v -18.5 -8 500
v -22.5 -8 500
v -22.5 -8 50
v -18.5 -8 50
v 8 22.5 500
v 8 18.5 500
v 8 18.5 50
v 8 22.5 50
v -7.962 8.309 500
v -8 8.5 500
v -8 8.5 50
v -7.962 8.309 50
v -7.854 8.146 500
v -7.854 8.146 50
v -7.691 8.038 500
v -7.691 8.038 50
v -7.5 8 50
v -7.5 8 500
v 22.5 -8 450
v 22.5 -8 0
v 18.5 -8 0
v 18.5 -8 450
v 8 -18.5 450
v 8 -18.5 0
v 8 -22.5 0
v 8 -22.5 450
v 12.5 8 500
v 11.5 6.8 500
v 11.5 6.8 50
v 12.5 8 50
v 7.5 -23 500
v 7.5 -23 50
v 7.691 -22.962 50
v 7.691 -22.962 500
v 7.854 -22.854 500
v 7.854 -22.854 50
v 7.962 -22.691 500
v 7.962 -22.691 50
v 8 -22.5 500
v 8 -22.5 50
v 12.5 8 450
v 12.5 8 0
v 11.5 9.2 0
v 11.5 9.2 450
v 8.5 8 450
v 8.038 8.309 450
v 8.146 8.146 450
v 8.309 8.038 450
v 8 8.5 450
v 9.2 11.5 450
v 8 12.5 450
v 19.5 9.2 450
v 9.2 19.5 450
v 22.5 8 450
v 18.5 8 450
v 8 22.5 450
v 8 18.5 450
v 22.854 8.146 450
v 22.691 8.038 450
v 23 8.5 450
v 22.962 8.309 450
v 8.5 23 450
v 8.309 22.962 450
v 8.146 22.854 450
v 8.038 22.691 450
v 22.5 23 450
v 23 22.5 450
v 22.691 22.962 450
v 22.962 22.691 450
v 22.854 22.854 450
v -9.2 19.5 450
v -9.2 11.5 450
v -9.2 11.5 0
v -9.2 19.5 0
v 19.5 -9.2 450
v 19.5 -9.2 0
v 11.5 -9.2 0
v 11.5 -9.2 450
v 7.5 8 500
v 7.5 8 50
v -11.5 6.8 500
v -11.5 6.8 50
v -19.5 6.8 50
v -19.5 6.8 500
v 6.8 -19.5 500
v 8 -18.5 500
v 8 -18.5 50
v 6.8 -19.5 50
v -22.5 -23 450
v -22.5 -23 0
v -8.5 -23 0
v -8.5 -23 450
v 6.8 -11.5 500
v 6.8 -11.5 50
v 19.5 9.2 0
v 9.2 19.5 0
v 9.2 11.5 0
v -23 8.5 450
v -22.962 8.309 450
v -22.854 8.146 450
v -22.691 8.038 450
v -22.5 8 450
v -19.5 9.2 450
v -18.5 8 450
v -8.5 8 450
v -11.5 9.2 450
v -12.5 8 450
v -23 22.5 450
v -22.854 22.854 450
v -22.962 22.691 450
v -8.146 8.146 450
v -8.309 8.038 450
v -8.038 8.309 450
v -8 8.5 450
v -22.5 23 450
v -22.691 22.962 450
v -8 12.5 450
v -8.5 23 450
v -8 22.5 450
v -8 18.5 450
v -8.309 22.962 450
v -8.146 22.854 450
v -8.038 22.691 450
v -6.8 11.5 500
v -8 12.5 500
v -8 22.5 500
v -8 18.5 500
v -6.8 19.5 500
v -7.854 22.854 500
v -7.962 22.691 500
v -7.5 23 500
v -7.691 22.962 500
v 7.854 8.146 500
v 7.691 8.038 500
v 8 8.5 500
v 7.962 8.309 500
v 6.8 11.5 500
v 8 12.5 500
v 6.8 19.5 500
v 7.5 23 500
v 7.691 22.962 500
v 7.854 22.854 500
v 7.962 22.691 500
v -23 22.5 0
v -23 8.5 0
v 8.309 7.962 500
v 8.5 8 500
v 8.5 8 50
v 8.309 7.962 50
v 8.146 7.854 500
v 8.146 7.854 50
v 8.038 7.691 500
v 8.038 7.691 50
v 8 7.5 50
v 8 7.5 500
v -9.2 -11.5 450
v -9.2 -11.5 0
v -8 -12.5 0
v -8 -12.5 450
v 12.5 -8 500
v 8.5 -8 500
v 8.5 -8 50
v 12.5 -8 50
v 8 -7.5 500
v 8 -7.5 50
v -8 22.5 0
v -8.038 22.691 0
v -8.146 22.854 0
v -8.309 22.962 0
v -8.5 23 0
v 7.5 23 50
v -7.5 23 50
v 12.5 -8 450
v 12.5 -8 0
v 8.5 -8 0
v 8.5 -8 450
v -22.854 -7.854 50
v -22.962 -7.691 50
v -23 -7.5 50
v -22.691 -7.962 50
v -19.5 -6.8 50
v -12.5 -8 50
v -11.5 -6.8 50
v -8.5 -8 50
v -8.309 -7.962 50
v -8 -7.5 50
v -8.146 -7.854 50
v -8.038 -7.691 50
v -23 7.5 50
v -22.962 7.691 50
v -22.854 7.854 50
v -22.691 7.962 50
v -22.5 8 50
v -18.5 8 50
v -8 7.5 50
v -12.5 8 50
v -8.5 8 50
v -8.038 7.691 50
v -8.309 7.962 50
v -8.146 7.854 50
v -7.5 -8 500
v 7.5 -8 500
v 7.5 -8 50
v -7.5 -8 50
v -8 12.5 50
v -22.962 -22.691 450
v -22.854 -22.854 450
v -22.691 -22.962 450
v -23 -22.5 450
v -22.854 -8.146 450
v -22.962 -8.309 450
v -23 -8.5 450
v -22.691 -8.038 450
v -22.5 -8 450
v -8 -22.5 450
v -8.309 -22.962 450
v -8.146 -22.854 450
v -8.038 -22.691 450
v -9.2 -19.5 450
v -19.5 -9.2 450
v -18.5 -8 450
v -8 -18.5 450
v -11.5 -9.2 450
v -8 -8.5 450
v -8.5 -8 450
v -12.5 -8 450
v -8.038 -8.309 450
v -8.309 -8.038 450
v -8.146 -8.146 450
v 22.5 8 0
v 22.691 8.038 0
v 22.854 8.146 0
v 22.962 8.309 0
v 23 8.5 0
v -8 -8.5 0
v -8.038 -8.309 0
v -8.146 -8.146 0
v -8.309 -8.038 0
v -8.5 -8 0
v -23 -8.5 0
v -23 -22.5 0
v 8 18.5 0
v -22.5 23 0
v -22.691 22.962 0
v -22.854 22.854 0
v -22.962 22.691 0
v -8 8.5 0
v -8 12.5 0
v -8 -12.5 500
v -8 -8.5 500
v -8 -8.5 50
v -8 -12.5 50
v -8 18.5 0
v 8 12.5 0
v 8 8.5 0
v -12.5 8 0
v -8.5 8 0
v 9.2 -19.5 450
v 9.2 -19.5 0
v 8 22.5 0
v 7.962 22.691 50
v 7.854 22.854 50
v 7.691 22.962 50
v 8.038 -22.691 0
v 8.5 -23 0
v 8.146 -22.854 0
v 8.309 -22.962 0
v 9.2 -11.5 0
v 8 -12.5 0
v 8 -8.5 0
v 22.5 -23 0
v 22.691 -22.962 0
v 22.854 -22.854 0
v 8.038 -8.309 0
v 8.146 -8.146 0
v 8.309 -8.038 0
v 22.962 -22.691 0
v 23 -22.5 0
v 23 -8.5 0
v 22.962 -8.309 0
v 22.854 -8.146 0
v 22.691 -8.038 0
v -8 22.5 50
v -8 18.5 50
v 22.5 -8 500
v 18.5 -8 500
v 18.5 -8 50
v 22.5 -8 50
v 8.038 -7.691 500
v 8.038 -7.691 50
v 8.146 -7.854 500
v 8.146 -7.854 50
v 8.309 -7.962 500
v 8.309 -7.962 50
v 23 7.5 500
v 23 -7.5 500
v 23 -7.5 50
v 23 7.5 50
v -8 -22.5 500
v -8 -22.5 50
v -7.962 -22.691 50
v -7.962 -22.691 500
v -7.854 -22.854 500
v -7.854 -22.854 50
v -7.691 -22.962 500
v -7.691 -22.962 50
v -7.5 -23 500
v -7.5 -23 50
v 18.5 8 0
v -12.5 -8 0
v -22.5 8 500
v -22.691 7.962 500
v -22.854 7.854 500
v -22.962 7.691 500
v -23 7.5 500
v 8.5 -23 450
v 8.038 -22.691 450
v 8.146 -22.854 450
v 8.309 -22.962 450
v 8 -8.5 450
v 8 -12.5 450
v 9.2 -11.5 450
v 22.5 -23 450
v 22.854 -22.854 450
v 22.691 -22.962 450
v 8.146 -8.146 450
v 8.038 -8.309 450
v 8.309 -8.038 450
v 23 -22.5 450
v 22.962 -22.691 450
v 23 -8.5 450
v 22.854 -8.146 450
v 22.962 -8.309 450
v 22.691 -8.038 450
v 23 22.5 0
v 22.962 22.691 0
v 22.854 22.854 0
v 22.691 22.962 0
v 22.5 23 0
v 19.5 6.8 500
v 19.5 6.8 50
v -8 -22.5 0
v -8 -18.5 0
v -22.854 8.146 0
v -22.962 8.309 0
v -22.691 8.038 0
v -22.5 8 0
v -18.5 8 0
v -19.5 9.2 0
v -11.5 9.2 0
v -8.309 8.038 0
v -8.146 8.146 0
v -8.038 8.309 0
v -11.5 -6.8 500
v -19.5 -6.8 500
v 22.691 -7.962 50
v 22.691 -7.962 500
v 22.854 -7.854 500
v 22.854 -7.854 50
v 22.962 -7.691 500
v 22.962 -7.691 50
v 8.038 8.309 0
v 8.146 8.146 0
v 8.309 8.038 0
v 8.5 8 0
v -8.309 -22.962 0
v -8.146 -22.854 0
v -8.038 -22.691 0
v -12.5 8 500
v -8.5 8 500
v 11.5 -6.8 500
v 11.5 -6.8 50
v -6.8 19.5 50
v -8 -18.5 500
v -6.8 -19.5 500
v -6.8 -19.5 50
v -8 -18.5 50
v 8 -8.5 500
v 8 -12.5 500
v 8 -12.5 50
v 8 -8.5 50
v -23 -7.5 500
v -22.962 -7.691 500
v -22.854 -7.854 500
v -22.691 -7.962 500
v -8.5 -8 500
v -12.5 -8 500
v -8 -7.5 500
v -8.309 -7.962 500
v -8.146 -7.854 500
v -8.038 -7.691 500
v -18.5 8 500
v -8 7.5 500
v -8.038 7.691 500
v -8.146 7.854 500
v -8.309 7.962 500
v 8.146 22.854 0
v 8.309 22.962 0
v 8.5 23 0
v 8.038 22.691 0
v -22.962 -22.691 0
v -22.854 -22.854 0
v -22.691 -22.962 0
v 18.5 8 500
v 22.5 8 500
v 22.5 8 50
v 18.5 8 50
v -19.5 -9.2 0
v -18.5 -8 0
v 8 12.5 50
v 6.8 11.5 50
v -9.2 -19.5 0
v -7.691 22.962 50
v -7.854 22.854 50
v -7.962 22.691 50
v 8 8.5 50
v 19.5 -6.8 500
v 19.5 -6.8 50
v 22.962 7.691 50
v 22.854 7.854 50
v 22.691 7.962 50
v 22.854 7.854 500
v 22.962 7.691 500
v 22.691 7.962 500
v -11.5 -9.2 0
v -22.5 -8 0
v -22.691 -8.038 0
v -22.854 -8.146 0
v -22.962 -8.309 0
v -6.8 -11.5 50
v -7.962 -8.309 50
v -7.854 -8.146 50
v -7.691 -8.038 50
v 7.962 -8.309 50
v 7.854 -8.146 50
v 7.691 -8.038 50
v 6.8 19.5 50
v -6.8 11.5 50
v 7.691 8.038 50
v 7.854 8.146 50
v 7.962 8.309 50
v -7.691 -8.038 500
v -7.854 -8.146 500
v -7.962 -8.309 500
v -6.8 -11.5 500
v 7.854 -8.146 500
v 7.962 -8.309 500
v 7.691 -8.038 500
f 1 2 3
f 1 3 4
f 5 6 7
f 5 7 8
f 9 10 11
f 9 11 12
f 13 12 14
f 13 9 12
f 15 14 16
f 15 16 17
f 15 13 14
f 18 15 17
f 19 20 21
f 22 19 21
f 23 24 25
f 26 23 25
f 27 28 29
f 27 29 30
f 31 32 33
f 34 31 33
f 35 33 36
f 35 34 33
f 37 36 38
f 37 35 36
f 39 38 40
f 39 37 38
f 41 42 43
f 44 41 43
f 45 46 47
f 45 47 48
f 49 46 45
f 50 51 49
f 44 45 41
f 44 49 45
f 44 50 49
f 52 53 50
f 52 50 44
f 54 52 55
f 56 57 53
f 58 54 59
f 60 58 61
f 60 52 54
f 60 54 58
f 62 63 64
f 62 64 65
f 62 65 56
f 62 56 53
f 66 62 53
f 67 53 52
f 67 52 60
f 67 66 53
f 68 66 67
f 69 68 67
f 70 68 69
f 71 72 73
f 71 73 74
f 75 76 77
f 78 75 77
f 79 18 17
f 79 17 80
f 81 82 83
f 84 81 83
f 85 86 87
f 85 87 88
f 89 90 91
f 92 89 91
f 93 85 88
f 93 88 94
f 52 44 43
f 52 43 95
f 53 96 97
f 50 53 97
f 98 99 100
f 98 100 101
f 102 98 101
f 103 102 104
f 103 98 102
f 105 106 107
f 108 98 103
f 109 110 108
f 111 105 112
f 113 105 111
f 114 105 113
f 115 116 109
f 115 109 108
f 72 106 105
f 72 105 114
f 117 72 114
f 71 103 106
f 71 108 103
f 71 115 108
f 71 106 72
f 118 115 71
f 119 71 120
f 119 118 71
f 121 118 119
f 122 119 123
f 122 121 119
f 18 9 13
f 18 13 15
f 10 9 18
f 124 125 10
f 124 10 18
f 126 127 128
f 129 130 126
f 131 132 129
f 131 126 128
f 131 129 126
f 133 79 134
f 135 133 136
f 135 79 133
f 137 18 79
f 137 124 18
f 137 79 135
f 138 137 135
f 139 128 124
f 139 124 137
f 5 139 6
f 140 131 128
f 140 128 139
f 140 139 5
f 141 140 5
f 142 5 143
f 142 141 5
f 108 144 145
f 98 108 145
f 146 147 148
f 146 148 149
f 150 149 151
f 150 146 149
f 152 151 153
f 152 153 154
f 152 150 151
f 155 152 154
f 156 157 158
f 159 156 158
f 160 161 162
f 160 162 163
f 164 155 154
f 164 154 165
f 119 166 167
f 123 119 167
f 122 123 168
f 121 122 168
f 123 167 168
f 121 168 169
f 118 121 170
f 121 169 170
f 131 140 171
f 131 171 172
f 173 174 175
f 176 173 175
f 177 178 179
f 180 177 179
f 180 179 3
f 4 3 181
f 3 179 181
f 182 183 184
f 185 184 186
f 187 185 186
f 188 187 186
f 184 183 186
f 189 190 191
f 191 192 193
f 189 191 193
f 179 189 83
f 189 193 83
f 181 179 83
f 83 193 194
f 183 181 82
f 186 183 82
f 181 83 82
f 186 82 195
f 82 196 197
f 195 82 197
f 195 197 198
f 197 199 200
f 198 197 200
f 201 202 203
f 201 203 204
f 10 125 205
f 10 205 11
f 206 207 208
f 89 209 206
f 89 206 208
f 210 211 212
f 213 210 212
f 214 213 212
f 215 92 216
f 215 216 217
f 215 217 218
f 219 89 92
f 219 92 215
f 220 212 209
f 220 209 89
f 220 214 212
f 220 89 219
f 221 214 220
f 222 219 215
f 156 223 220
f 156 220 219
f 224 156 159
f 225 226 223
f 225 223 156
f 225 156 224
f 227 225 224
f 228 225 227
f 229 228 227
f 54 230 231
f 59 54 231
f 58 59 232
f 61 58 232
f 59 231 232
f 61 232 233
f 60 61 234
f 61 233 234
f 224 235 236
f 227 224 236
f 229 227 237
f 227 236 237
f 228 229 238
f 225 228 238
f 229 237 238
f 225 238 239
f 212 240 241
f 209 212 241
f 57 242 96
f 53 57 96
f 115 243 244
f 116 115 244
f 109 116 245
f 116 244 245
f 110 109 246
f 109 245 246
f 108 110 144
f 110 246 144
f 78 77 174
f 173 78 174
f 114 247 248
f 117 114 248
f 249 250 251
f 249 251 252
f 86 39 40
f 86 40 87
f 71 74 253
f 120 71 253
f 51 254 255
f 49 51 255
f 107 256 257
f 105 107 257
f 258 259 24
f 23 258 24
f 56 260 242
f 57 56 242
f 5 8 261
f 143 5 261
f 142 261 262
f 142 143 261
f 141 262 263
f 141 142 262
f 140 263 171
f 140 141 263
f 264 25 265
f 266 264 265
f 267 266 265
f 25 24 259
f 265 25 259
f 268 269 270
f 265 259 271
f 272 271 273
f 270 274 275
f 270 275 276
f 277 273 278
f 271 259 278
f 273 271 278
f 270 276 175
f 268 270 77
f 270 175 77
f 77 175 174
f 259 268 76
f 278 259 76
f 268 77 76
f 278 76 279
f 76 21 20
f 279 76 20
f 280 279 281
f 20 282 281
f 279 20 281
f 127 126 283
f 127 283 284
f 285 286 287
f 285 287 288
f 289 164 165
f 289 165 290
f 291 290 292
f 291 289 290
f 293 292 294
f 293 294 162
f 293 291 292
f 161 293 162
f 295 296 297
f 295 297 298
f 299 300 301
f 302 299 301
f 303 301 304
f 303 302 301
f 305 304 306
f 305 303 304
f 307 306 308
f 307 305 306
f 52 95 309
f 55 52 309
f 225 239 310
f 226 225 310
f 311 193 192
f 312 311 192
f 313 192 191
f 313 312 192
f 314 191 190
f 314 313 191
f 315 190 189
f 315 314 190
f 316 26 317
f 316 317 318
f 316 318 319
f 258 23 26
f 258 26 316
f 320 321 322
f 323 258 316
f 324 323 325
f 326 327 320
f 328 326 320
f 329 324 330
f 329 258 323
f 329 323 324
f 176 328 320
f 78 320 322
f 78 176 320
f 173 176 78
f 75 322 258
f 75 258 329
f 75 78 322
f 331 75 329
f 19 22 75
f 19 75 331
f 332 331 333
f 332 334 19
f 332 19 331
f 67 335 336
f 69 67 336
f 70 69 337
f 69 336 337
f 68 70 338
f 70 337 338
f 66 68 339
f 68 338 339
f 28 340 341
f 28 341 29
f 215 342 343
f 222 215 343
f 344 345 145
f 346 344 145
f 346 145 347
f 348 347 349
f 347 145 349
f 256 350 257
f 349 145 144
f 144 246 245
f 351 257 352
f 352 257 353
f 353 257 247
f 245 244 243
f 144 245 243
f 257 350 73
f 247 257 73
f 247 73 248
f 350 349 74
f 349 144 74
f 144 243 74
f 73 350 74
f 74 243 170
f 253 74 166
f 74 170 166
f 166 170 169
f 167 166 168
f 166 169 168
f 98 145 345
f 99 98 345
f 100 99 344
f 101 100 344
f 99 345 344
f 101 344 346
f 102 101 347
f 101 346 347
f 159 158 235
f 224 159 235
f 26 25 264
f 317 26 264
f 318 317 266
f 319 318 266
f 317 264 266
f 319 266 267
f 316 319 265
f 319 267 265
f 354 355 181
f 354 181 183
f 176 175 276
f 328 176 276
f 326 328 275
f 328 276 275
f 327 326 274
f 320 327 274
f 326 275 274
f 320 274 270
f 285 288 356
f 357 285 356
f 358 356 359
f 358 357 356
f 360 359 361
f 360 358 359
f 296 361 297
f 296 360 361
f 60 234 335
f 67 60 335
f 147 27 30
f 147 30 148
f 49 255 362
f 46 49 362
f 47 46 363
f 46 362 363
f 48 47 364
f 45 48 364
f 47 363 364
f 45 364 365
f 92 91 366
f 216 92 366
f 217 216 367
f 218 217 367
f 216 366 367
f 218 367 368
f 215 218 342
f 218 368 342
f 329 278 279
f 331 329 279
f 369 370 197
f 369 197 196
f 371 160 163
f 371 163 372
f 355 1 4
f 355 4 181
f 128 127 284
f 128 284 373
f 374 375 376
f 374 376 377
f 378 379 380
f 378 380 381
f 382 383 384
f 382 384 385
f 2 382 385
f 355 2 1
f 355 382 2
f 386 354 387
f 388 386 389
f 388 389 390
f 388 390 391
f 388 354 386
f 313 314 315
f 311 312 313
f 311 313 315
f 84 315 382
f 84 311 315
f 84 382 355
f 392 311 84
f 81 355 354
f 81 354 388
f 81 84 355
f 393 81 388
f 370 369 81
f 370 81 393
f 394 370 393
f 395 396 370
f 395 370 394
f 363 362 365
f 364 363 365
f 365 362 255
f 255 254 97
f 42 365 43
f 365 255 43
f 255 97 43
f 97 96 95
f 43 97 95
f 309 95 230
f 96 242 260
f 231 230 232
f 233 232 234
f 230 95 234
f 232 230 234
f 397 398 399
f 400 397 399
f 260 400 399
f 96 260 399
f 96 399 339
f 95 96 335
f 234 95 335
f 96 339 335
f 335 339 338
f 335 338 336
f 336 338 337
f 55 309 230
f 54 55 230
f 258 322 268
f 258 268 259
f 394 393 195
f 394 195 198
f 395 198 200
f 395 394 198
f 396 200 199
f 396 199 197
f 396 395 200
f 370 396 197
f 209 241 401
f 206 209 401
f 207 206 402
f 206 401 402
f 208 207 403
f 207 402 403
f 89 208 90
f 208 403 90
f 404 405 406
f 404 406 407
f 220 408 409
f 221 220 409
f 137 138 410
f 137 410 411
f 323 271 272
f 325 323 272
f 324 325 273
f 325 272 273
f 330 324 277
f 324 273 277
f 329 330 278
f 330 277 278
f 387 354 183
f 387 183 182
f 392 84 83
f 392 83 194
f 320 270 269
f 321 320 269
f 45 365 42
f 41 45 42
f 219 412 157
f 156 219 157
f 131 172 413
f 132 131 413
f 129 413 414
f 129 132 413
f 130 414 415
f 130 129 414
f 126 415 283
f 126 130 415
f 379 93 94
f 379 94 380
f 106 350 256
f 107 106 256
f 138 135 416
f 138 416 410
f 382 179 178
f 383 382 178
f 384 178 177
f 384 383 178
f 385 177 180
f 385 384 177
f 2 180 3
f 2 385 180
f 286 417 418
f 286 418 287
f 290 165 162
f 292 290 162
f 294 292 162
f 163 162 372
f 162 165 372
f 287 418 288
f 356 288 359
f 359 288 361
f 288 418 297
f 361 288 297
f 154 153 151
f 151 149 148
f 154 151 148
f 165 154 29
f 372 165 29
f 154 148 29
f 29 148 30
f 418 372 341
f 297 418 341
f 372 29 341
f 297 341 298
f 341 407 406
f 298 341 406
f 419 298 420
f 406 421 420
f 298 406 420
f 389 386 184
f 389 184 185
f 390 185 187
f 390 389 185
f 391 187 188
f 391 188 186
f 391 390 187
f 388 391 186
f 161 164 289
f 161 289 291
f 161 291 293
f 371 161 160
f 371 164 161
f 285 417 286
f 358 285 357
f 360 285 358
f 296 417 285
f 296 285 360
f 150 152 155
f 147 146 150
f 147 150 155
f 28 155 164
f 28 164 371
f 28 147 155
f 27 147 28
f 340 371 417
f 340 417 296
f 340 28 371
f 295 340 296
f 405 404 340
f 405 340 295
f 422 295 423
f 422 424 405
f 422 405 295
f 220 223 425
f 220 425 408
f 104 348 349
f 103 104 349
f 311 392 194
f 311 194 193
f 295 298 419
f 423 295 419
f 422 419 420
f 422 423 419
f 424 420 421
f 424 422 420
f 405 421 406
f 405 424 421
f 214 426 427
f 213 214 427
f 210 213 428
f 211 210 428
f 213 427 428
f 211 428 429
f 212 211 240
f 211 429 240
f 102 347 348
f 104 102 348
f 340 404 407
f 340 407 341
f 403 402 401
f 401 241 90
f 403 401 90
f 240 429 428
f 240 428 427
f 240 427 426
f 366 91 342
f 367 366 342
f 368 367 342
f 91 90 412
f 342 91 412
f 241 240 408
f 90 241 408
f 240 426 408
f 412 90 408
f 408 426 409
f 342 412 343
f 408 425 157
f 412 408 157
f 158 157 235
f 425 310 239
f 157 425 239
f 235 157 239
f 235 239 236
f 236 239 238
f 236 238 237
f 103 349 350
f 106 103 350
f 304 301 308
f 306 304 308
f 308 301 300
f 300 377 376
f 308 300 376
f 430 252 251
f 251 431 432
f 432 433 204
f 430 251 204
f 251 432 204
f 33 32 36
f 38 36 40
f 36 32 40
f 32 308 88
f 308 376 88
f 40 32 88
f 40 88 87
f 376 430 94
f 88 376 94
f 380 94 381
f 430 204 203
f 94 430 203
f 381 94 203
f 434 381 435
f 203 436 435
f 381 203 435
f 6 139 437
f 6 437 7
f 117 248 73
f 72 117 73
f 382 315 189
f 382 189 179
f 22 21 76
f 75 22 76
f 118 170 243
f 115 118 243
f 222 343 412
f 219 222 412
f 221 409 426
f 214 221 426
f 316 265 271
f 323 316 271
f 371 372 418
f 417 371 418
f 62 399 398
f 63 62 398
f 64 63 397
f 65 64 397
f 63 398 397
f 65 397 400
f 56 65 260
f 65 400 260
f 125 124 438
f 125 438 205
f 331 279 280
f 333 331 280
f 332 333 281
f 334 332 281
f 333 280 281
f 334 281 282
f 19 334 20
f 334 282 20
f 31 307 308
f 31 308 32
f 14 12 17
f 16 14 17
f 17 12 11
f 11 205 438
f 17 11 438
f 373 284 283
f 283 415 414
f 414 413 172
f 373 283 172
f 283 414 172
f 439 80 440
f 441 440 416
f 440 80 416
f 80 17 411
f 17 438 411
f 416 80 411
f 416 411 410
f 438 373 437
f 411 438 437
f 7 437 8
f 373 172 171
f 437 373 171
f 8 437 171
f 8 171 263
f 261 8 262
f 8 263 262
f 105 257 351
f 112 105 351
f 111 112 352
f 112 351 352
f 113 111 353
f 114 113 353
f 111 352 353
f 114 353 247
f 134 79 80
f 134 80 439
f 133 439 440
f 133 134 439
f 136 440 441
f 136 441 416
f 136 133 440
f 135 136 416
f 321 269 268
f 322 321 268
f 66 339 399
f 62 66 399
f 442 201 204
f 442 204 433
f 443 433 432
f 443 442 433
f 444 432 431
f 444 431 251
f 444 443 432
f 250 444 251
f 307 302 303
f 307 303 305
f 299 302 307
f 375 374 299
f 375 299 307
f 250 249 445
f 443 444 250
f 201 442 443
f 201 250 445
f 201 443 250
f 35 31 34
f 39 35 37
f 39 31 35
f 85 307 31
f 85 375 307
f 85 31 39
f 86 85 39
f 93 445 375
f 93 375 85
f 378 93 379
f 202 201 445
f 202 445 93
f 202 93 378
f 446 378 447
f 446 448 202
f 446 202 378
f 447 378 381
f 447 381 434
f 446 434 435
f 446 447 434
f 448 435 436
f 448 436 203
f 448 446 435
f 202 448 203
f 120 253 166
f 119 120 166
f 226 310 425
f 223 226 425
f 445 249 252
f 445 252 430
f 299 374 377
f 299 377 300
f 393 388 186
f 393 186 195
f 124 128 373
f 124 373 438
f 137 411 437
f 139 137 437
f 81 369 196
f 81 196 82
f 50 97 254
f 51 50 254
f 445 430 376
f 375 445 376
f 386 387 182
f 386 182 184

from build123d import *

# Parameters (mm, degrees)
F4_DEPTH = 450
F5_DEPTH = 450


with BuildPart() as f4:
    # F2 (on Top) → F4 (new body)
    with BuildSketch(Plane.XY):
        with BuildLine():
            Line((-22.5, -23), (-8.5, -23))
            ThreePointArc((-8.5, -23), (-8.146447, -22.853553), (-8, -22.5))
            Line((-8, -22.5), (-8, -18.5))
            Line((-8, -18.5), (-9.2, -19.5))
            Line((-9.2, -19.5), (-9.2, -15.5))
            Line((-9.2, -15.5), (-9.2, -11.5))
            Line((-9.2, -11.5), (-8, -12.5))
            Line((-8, -12.5), (-8, -8.5))
            ThreePointArc((-8, -8.5), (-8.146447, -8.146447), (-8.5, -8))
            Line((-8.5, -8), (-12.5, -8))
            Line((-12.5, -8), (-11.5, -9.2))
            Line((-11.5, -9.2), (-15.5, -9.2))
            Line((-15.5, -9.2), (-19.5, -9.2))
            Line((-19.5, -9.2), (-18.5, -8))
            Line((-18.5, -8), (-22.5, -8))
            ThreePointArc((-22.5, -8), (-22.853553, -8.146447), (-23, -8.5))
            Line((-23, -8.5), (-23, -22.5))
            ThreePointArc((-23, -22.5), (-22.853553, -22.853553), (-22.5, -23))
        make_face()
        with BuildLine():
            ThreePointArc((8, -22.5), (8.146447, -22.853553), (8.5, -23))
            Line((8.5, -23), (22.5, -23))
            ThreePointArc((22.5, -23), (22.853553, -22.853553), (23, -22.5))
            Line((23, -22.5), (23, -8.5))
            ThreePointArc((23, -8.5), (22.853553, -8.146447), (22.5, -8))
            Line((22.5, -8), (18.5, -8))
            Line((18.5, -8), (19.5, -9.2))
            Line((19.5, -9.2), (15.5, -9.2))
            Line((15.5, -9.2), (11.5, -9.2))
            Line((11.5, -9.2), (12.5, -8))
            Line((12.5, -8), (8.5, -8))
            ThreePointArc((8.5, -8), (8.146447, -8.146447), (8, -8.5))
            Line((8, -8.5), (8, -12.5))
            Line((8, -12.5), (9.2, -11.5))
            Line((9.2, -11.5), (9.2, -15.5))
            Line((9.2, -15.5), (9.2, -19.5))
            Line((9.2, -19.5), (8, -18.5))
            Line((8, -18.5), (8, -22.5))
        make_face()
        with BuildLine():
            ThreePointArc((22.5, 8), (22.853553, 8.146447), (23, 8.5))
            Line((23, 8.5), (23, 22.5))
            ThreePointArc((23, 22.5), (22.853553, 22.853553), (22.5, 23))
            Line((22.5, 23), (8.5, 23))
            ThreePointArc((8.5, 23), (8.146447, 22.853553), (8, 22.5))
            Line((8, 22.5), (8, 18.5))
            Line((8, 18.5), (9.2, 19.5))
            Line((9.2, 19.5), (9.2, 15.5))
            Line((9.2, 15.5), (9.2, 11.5))
            Line((9.2, 11.5), (8, 12.5))
            Line((8, 12.5), (8, 8.5))
            ThreePointArc((8, 8.5), (8.146447, 8.146447), (8.5, 8))
            Line((8.5, 8), (12.5, 8))
            Line((12.5, 8), (11.5, 9.2))
            Line((11.5, 9.2), (15.5, 9.2))
            Line((15.5, 9.2), (19.5, 9.2))
            Line((19.5, 9.2), (18.5, 8))
            Line((18.5, 8), (22.5, 8))
        make_face()
        with BuildLine():
            ThreePointArc((-8, 22.5), (-8.146447, 22.853553), (-8.5, 23))
            Line((-8.5, 23), (-22.5, 23))
            ThreePointArc((-22.5, 23), (-22.853553, 22.853553), (-23, 22.5))
            Line((-23, 22.5), (-23, 8.5))
            ThreePointArc((-23, 8.5), (-22.853553, 8.146447), (-22.5, 8))
            Line((-22.5, 8), (-18.5, 8))
            Line((-18.5, 8), (-19.5, 9.2))
            Line((-19.5, 9.2), (-15.5, 9.2))
            Line((-15.5, 9.2), (-11.5, 9.2))
            Line((-11.5, 9.2), (-12.5, 8))
            Line((-12.5, 8), (-8.5, 8))
            ThreePointArc((-8.5, 8), (-8.146447, 8.146447), (-8, 8.5))
            Line((-8, 8.5), (-8, 12.5))
            Line((-8, 12.5), (-9.2, 11.5))
            Line((-9.2, 11.5), (-9.2, 15.5))
            Line((-9.2, 15.5), (-9.2, 19.5))
            Line((-9.2, 19.5), (-8, 18.5))
            Line((-8, 18.5), (-8, 22.5))
        make_face()
    extrude(amount=F4_DEPTH)


with BuildPart() as f5:
    # F3 (on offset) → F5 (new body)
    with BuildSketch(Plane.XY.offset(500)):
        with BuildLine():
            Line((-18.5, 8), (-22.5, 8))
            ThreePointArc((-22.5, 8), (-22.853553, 7.853553), (-23, 7.5))
            Line((-23, 7.5), (-23, 0))
            Line((-23, 0), (-23, -7.5))
            ThreePointArc((-23, -7.5), (-22.853553, -7.853553), (-22.5, -8))
            Line((-22.5, -8), (-18.5, -8))
            Line((-18.5, -8), (-19.5, -6.8))
            Line((-19.5, -6.8), (-15.5, -6.8))
            Line((-15.5, -6.8), (-11.5, -6.8))
            Line((-11.5, -6.8), (-12.5, -8))
            Line((-12.5, -8), (-8.5, -8))
            ThreePointArc((-8.5, -8), (-8.146447, -7.853553), (-8, -7.5))
            Line((-8, -7.5), (-8, 0))
            Line((-8, 0), (-8, 7.5))
            ThreePointArc((-8, 7.5), (-8.146447, 7.853553), (-8.5, 8))
            Line((-8.5, 8), (-12.5, 8))
            Line((-12.5, 8), (-11.5, 6.8))
            Line((-11.5, 6.8), (-15.5, 6.8))
            Line((-15.5, 6.8), (-19.5, 6.8))
            Line((-19.5, 6.8), (-18.5, 8))
        make_face()
        with BuildLine():
            Line((8, -12.5), (8, -8.5))
            ThreePointArc((8, -8.5), (7.853553, -8.146447), (7.5, -8))
            Line((7.5, -8), (0, -8))
            Line((0, -8), (-7.5, -8))
            ThreePointArc((-7.5, -8), (-7.853553, -8.146447), (-8, -8.5))
            Line((-8, -8.5), (-8, -12.5))
            Line((-8, -12.5), (-6.8, -11.5))
            Line((-6.8, -11.5), (-6.8, -15.5))
            Line((-6.8, -15.5), (-6.8, -19.5))
            Line((-6.8, -19.5), (-8, -18.5))
            Line((-8, -18.5), (-8, -22.5))
            ThreePointArc((-8, -22.5), (-7.853553, -22.853553), (-7.5, -23))
            Line((-7.5, -23), (0, -23))
            Line((0, -23), (7.5, -23))
            ThreePointArc((7.5, -23), (7.853553, -22.853553), (8, -22.5))
            Line((8, -22.5), (8, -18.5))
            Line((8, -18.5), (6.8, -19.5))
            Line((6.8, -19.5), (6.8, -15.5))
            Line((6.8, -15.5), (6.8, -11.5))
            Line((6.8, -11.5), (8, -12.5))
        make_face()
        with BuildLine():
            Line((12.5, 8), (8.5, 8))
            ThreePointArc((8.5, 8), (8.146447, 7.853553), (8, 7.5))
            Line((8, 7.5), (8, 0))
            Line((8, 0), (8, -7.5))
            ThreePointArc((8, -7.5), (8.146447, -7.853553), (8.5, -8))
            Line((8.5, -8), (12.5, -8))
            Line((12.5, -8), (11.5, -6.8))
            Line((11.5, -6.8), (15.5, -6.8))
            Line((15.5, -6.8), (19.5, -6.8))
            Line((19.5, -6.8), (18.5, -8))
            Line((18.5, -8), (22.5, -8))
            ThreePointArc((22.5, -8), (22.853553, -7.853553), (23, -7.5))
            Line((23, -7.5), (23, 0))
            Line((23, 0), (23, 7.5))
            ThreePointArc((23, 7.5), (22.853553, 7.853553), (22.5, 8))
            Line((22.5, 8), (18.5, 8))
            Line((18.5, 8), (19.5, 6.8))
            Line((19.5, 6.8), (15.5, 6.8))
            Line((15.5, 6.8), (11.5, 6.8))
            Line((11.5, 6.8), (12.5, 8))
        make_face()
        with BuildLine():
            Line((-8, 12.5), (-8, 8.5))
            ThreePointArc((-8, 8.5), (-7.853553, 8.146447), (-7.5, 8))
            Line((-7.5, 8), (0, 8))
            Line((0, 8), (7.5, 8))
            ThreePointArc((7.5, 8), (7.853553, 8.146447), (8, 8.5))
            Line((8, 8.5), (8, 12.5))
            Line((8, 12.5), (6.8, 11.5))
            Line((6.8, 11.5), (6.8, 15.5))
            Line((6.8, 15.5), (6.8, 19.5))
            Line((6.8, 19.5), (8, 18.5))
            Line((8, 18.5), (8, 22.5))
            ThreePointArc((8, 22.5), (7.853553, 22.853553), (7.5, 23))
            Line((7.5, 23), (0, 23))
            Line((0, 23), (-7.5, 23))
            ThreePointArc((-7.5, 23), (-7.853553, 22.853553), (-8, 22.5))
            Line((-8, 22.5), (-8, 18.5))
            Line((-8, 18.5), (-6.8, 19.5))
            Line((-6.8, 19.5), (-6.8, 15.5))
            Line((-6.8, 15.5), (-6.8, 11.5))
            Line((-6.8, 11.5), (-8, 12.5))
        make_face()
    extrude(amount=-F5_DEPTH)


solid = Compound([f4.part, f5.part])
